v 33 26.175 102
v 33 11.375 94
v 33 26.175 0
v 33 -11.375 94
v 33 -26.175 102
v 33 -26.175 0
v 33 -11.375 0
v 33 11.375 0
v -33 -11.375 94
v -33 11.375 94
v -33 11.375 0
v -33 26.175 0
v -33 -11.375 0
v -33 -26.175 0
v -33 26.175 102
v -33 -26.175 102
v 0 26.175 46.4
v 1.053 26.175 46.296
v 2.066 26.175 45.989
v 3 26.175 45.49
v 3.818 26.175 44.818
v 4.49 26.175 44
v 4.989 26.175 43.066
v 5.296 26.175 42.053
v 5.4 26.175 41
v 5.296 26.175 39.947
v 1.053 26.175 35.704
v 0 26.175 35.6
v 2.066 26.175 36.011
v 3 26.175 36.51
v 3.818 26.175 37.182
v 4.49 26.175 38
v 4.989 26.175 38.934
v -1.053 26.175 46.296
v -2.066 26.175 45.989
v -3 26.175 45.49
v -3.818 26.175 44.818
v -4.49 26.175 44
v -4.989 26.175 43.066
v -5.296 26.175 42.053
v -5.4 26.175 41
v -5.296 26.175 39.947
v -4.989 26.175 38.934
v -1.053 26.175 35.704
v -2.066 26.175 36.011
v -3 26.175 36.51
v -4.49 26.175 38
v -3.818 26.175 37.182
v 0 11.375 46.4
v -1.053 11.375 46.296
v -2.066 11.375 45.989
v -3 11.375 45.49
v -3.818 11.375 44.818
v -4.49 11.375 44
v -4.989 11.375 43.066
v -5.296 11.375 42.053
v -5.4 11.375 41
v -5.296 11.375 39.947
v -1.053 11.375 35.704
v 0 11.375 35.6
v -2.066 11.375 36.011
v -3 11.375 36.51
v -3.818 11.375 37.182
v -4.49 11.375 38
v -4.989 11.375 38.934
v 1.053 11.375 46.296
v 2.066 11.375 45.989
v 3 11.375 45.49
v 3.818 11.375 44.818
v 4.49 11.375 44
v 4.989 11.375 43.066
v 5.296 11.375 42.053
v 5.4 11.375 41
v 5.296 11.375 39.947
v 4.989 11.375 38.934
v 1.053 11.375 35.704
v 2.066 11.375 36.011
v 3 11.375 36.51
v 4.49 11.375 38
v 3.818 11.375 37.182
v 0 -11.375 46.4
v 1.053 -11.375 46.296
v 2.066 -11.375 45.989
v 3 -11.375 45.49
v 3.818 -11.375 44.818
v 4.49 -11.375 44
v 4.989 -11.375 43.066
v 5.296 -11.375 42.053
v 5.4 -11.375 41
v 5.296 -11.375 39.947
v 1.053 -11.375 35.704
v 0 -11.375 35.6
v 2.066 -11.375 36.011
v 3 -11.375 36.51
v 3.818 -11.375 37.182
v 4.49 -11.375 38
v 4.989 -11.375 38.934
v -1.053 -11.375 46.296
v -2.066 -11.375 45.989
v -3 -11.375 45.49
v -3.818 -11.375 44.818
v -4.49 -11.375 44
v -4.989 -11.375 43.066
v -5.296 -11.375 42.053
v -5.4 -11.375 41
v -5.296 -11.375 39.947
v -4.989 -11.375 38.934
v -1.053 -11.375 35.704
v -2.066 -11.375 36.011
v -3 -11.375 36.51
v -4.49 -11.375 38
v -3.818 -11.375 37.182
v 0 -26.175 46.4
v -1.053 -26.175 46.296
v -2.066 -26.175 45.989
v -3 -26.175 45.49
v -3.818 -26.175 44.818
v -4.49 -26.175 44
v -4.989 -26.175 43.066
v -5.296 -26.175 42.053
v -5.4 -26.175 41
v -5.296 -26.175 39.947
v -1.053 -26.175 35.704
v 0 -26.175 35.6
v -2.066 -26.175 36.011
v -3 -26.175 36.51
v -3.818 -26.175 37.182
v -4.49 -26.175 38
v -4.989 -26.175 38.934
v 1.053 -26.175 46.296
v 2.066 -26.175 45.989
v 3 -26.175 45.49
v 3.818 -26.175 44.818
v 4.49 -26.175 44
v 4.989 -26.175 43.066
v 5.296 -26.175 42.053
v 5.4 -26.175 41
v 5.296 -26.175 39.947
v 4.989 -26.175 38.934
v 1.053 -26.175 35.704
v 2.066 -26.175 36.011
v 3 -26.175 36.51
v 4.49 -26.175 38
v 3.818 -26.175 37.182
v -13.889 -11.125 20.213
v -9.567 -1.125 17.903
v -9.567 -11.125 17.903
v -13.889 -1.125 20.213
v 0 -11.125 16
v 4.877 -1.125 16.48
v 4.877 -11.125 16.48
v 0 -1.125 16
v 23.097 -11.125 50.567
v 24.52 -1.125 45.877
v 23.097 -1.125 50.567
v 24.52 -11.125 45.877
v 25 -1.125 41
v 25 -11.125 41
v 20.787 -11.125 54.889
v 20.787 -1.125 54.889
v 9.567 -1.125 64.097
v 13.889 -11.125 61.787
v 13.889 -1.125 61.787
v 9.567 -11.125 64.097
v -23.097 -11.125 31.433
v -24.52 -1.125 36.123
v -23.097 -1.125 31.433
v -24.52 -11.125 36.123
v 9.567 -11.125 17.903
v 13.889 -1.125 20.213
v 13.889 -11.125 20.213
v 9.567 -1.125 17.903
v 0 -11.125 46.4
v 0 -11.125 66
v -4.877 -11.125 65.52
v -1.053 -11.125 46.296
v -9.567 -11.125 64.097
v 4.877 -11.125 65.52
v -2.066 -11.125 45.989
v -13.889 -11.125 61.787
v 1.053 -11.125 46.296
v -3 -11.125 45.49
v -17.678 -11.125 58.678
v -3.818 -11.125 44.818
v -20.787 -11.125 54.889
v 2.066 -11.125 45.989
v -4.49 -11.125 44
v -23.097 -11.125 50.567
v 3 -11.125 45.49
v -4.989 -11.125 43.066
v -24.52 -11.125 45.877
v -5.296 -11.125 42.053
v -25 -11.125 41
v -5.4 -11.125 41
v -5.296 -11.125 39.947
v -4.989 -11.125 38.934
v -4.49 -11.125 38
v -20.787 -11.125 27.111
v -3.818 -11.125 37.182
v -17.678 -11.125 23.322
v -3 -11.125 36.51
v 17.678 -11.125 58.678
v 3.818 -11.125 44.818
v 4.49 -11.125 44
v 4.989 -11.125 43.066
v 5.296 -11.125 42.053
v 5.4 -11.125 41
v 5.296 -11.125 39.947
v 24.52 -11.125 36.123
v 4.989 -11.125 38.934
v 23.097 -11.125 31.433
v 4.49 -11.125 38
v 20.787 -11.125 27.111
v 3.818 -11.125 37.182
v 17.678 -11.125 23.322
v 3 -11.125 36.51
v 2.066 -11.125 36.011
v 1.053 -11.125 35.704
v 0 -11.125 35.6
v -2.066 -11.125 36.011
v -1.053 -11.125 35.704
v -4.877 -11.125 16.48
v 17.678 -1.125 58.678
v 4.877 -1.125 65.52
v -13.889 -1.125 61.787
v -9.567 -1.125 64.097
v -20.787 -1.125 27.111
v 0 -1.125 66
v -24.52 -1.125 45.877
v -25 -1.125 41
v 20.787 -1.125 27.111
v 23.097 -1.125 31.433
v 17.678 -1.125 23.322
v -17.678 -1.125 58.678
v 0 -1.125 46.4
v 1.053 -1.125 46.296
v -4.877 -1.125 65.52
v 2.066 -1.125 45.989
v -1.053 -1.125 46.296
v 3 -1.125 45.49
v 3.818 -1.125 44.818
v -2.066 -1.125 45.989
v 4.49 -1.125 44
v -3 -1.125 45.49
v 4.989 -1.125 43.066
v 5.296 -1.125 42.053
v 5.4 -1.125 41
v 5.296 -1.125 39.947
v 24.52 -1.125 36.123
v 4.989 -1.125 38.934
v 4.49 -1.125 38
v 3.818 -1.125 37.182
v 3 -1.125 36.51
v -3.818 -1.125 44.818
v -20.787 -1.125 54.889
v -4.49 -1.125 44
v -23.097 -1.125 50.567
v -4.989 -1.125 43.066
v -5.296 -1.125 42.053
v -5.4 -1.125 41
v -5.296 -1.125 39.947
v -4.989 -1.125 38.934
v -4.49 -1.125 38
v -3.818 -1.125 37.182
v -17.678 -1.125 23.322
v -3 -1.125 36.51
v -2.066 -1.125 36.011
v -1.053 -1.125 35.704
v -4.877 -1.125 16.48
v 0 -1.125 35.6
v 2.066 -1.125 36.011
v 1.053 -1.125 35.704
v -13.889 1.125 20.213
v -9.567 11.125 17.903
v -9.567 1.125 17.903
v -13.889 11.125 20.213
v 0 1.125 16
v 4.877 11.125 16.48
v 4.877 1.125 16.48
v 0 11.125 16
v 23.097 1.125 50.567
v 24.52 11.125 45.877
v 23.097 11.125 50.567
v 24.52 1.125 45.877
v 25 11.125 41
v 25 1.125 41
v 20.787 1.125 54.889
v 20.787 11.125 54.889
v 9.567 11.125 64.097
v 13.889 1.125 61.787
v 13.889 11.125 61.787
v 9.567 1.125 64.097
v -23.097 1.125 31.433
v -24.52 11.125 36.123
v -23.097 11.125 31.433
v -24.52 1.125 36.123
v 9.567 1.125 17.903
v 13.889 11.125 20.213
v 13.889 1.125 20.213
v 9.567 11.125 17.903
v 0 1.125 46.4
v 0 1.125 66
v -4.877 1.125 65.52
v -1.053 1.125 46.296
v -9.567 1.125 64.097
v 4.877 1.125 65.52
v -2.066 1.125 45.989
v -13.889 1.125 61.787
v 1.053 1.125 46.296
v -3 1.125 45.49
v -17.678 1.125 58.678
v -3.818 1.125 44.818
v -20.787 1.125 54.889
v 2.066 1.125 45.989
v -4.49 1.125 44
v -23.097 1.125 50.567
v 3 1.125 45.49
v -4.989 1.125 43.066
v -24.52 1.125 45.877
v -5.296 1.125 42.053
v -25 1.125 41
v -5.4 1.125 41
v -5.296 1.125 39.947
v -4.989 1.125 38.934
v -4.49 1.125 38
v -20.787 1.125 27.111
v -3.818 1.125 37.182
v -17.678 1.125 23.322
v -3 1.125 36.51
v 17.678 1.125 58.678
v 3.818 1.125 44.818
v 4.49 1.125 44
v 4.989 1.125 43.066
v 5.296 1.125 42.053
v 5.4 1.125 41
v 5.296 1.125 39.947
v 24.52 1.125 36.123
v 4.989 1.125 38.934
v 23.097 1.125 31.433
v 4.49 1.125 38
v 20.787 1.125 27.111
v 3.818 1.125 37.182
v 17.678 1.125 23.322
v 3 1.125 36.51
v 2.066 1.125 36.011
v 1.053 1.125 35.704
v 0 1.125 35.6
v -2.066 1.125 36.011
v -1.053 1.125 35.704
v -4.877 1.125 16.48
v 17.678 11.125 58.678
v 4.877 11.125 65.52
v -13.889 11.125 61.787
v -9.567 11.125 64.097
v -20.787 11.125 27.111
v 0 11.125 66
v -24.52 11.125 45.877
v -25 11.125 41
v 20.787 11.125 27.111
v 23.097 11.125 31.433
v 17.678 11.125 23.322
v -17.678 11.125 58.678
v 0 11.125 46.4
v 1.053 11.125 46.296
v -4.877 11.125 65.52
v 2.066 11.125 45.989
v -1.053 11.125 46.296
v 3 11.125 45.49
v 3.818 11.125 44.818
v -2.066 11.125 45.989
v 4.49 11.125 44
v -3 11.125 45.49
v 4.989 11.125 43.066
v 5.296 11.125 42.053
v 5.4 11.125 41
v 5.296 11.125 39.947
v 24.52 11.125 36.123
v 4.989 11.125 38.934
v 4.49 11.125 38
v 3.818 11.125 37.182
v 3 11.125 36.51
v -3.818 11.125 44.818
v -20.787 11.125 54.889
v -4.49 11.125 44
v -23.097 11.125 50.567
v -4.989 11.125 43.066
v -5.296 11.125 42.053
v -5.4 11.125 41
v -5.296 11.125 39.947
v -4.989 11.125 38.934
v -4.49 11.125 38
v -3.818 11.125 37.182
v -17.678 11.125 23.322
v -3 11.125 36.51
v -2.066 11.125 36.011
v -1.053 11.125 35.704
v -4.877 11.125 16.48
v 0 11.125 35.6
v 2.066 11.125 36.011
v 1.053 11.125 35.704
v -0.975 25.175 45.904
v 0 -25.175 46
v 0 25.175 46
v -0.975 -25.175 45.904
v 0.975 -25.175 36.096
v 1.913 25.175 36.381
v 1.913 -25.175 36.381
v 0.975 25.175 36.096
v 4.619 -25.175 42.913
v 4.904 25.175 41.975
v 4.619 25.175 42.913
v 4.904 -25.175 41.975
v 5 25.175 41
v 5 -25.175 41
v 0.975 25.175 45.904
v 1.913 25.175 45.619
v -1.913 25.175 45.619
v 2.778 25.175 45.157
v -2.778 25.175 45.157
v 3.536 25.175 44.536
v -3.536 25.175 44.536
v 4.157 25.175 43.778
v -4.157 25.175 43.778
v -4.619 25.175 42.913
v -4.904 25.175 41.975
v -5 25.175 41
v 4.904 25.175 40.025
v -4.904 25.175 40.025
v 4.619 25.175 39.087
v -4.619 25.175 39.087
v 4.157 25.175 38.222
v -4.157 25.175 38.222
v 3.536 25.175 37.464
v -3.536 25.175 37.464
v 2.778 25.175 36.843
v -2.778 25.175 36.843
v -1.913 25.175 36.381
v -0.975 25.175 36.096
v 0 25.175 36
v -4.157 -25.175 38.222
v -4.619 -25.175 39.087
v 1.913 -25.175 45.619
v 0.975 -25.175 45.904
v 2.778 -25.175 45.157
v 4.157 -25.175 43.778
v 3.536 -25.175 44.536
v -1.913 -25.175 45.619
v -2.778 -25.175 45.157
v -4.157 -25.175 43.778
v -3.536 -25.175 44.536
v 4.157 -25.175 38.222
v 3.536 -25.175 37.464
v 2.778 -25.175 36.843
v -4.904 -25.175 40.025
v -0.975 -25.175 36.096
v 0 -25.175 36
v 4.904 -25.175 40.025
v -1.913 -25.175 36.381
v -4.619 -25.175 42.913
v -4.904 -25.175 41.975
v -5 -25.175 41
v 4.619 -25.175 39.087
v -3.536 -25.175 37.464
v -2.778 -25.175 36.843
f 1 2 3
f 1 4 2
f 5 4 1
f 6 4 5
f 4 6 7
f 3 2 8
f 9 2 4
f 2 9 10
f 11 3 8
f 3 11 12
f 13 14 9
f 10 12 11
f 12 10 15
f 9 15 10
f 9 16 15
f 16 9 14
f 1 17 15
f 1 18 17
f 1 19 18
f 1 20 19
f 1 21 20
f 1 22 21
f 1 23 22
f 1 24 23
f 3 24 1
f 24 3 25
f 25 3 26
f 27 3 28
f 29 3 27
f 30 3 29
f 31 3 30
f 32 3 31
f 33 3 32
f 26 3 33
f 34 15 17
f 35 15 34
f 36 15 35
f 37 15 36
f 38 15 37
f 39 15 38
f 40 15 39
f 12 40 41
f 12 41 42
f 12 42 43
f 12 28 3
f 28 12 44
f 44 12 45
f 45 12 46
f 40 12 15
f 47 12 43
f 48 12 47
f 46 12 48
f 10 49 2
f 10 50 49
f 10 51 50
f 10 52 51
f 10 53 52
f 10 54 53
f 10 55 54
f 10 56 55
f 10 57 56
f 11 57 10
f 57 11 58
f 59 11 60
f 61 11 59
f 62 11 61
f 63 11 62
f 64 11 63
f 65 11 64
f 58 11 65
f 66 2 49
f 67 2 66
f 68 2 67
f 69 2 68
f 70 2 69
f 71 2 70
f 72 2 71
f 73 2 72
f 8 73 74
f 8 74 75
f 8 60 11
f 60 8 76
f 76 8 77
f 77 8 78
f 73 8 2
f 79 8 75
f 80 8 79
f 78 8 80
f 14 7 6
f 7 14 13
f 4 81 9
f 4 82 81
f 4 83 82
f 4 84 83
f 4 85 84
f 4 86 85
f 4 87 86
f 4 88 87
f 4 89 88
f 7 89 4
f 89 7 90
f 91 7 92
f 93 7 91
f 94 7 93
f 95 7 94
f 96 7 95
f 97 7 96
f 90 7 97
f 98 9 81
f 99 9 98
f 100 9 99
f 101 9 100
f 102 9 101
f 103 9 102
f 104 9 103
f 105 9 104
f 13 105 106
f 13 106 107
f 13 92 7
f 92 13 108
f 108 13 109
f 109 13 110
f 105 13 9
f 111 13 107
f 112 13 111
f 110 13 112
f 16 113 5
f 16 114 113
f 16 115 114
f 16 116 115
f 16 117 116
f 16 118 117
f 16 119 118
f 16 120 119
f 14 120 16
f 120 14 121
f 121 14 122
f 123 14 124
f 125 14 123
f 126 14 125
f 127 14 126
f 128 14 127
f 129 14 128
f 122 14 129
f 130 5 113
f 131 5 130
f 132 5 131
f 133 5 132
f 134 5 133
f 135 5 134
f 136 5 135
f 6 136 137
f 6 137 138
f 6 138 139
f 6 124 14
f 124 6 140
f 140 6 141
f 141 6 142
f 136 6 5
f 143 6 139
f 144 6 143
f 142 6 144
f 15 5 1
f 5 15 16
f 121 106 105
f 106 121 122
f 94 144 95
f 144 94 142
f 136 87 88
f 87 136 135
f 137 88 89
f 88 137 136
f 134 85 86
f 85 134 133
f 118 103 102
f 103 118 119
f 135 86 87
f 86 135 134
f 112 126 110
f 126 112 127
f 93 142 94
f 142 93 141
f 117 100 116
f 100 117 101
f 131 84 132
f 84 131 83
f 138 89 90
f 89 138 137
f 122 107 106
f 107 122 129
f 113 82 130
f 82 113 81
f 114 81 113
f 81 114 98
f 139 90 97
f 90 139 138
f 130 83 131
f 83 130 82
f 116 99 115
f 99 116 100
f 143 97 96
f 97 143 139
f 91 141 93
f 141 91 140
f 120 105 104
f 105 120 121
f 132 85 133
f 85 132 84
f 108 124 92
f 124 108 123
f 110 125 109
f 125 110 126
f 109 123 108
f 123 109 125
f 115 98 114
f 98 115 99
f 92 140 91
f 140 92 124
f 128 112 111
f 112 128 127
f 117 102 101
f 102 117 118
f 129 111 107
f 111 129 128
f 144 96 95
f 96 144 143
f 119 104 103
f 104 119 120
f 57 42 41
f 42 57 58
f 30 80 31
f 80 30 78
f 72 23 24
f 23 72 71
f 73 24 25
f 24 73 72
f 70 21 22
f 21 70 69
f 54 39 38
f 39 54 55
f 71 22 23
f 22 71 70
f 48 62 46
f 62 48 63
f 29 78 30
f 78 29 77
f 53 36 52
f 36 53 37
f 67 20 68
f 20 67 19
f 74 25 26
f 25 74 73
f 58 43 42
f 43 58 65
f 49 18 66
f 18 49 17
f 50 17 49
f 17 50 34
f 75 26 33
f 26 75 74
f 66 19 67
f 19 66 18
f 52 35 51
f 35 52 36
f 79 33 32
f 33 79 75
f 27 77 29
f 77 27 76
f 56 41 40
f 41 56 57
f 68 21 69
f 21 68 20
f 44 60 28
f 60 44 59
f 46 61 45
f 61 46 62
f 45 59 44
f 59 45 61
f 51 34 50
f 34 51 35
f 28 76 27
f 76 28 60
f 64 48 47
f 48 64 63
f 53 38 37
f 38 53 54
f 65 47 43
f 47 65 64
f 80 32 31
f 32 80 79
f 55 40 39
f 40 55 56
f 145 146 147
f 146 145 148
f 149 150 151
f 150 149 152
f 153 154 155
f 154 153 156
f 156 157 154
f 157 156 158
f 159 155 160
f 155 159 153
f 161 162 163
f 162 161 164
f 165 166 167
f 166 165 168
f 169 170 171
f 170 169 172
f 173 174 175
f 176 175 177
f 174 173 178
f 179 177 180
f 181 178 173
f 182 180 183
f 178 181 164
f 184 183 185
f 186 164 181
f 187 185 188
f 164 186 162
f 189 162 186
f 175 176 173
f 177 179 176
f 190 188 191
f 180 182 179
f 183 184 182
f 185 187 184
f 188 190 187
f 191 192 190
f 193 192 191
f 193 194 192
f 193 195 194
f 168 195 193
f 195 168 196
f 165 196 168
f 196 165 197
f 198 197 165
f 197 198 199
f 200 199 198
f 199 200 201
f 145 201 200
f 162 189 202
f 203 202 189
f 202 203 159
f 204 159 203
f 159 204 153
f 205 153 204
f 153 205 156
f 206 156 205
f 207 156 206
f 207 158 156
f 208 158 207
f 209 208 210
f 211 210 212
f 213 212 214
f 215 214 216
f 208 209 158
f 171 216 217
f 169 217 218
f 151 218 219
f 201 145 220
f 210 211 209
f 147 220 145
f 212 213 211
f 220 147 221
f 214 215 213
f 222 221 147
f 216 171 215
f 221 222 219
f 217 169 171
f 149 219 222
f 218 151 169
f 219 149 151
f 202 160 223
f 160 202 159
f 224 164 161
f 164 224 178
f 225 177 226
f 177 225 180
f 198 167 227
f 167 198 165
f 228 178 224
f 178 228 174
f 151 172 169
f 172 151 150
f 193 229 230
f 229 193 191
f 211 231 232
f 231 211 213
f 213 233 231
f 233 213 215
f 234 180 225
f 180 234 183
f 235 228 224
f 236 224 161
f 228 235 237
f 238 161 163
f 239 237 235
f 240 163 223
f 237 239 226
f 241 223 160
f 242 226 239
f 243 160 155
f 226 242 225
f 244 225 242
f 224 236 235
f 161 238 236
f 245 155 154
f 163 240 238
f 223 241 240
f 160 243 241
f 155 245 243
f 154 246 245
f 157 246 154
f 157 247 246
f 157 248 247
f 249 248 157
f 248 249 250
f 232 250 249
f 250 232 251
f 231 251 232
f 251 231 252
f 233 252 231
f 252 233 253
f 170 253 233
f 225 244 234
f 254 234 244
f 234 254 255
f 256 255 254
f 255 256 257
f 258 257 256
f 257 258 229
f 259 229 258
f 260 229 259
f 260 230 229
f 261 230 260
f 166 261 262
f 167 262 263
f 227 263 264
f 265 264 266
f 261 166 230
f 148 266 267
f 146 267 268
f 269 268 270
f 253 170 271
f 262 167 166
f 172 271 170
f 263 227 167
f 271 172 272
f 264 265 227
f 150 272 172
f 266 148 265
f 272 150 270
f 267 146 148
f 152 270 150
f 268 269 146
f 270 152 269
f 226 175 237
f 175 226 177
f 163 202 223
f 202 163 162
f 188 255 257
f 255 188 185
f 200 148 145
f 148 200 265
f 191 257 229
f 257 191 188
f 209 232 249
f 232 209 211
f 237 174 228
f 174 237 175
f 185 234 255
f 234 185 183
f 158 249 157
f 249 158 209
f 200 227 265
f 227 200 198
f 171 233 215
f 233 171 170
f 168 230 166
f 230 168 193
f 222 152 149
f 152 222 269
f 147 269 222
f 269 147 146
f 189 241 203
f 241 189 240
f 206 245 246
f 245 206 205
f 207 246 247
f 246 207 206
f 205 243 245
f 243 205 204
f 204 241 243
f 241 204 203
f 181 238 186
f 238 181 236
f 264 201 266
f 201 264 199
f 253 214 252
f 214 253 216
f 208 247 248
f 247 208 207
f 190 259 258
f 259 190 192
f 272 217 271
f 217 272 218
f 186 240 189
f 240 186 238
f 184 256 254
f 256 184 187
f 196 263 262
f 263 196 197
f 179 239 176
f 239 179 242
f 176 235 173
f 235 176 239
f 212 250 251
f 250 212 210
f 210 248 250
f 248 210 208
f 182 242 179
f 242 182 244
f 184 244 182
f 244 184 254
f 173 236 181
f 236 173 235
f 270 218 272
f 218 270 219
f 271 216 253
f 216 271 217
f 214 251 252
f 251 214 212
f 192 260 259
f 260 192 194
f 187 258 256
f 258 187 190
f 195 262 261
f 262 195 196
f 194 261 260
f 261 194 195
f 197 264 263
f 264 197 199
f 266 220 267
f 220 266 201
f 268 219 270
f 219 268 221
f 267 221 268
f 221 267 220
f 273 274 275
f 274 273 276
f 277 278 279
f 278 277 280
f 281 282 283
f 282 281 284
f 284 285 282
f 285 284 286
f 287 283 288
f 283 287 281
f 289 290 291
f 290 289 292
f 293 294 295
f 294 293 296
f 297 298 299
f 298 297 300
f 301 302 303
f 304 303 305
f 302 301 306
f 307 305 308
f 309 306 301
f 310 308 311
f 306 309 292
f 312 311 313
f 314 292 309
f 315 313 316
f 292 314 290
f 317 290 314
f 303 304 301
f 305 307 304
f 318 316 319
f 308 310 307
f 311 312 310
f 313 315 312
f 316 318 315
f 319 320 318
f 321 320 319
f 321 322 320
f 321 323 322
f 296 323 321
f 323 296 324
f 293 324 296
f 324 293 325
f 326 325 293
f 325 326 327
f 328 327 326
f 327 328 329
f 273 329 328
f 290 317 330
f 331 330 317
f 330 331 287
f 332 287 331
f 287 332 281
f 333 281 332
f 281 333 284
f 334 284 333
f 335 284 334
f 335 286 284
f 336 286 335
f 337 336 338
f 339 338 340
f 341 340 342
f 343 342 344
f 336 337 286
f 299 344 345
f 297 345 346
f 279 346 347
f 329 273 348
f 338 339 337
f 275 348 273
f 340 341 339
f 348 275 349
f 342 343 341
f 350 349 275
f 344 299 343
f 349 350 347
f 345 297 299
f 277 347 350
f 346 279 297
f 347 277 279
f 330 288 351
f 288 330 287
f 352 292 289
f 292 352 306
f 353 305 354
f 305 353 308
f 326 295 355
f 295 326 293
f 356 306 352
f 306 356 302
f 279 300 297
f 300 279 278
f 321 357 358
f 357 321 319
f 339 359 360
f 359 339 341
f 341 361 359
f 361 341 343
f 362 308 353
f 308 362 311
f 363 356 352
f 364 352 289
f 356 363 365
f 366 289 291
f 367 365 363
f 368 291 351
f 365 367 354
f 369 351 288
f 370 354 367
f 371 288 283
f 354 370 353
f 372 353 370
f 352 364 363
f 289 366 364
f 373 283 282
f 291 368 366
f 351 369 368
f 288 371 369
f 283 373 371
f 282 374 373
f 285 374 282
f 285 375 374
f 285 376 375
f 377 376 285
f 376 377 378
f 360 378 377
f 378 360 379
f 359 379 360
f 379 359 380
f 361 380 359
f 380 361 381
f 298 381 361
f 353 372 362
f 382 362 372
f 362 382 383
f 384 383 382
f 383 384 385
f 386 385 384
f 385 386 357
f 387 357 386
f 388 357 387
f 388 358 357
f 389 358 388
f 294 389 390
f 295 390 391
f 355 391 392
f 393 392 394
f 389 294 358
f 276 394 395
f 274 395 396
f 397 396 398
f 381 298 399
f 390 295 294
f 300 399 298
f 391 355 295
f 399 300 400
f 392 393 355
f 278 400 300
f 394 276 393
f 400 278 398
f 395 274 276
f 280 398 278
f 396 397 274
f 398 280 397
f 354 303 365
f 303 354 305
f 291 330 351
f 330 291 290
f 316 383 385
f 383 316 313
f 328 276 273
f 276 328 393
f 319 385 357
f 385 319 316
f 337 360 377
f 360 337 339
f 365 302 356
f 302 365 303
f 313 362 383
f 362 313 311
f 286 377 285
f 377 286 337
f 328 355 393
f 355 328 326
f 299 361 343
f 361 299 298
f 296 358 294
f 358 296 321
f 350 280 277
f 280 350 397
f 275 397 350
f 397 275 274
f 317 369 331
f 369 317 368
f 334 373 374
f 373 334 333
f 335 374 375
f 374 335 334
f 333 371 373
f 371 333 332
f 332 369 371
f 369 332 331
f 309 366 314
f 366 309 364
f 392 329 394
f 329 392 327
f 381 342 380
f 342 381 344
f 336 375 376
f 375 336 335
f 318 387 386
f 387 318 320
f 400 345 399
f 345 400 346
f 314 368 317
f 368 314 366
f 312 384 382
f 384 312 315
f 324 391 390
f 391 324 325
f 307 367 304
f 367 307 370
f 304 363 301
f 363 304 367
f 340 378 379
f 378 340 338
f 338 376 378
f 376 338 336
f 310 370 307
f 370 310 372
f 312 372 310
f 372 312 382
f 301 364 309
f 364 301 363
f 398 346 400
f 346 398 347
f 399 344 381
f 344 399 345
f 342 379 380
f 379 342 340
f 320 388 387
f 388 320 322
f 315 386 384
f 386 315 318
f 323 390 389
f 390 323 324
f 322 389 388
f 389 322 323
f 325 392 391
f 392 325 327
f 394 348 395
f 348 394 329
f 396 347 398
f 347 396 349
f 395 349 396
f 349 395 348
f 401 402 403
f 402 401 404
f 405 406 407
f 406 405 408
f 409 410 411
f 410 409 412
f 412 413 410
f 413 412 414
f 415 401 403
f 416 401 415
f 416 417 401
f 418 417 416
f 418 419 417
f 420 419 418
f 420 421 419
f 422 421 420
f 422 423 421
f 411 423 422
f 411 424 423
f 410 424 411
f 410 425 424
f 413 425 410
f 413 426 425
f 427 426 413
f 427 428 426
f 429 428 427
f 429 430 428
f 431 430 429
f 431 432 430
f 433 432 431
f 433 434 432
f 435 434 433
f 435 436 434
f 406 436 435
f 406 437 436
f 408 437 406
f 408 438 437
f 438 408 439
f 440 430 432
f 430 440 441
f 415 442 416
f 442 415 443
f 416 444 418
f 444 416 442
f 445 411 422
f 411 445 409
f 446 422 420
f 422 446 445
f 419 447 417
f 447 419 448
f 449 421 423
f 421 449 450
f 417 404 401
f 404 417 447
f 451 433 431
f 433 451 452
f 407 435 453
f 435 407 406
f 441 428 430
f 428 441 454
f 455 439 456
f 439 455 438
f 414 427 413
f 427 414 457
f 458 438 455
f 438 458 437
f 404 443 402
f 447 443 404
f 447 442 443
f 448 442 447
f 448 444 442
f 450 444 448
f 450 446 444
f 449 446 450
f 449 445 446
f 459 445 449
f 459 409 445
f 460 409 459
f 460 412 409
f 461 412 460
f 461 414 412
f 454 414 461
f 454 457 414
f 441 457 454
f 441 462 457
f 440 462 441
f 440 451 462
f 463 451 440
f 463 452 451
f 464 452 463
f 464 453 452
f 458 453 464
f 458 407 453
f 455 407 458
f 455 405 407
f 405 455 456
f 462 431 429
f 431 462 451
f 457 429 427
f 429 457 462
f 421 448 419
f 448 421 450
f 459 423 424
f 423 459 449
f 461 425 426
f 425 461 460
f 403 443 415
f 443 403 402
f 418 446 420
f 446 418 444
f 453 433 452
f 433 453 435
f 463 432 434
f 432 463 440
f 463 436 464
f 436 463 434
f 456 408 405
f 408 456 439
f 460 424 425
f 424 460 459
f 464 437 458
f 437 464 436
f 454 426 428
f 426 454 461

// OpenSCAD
$fn = 32;

// ------------------------------------------------------------------------
// Trolley wheel set: wheels d50, fork 94 mm tall
// Every part is its own module, assembly() places every instance.
// ------------------------------------------------------------------------

// --- part 1 ---
module trolley_fork() {
  difference() {
    union() {
      translate([-33, 11.375, 0]) cube([66, 14.8, 94]);
      translate([-33, -26.175, 0]) cube([66, 14.8, 94]);
      translate([-33, -26.175, 94]) cube([66, 52.35, 8]);
    }
    translate([0, -18.775, 41]) rotate([90, 0, 0]) cylinder(h = 16.8, d = 10.8, center = true);
    translate([0, 18.775, 41]) rotate([90, 0, 0]) cylinder(h = 16.8, d = 10.8, center = true);
  }
}

// --- part 2 ---
module trolley_wheel() {
  difference() {
      translate([0, 0, 0]) cylinder(h = 10, d = 50);
      translate([0, 0, -1]) cylinder(h = 12, d = 10.8);
    }
}

// --- part 3 ---
module trolley_axle() {
  translate([0, 0, -25.175]) cylinder(h = 50.35, d = 10);
}

// --- assembly ---
module assembly() {
  color([0.80, 0.24, 0.20]) translate([0, 0, 0]) rotate([0, 0, 0]) trolley_fork();
  color([0.20, 0.45, 0.75]) translate([0, -1.125, 41]) rotate([90, 0, 0]) trolley_wheel();
  color([0.25, 0.62, 0.32]) translate([0, 11.125, 41]) rotate([90, 0, 0]) trolley_wheel();
  color([0.92, 0.70, 0.18]) translate([0, 0, 41]) rotate([90, 0, 0]) trolley_axle();
}

assembly();
